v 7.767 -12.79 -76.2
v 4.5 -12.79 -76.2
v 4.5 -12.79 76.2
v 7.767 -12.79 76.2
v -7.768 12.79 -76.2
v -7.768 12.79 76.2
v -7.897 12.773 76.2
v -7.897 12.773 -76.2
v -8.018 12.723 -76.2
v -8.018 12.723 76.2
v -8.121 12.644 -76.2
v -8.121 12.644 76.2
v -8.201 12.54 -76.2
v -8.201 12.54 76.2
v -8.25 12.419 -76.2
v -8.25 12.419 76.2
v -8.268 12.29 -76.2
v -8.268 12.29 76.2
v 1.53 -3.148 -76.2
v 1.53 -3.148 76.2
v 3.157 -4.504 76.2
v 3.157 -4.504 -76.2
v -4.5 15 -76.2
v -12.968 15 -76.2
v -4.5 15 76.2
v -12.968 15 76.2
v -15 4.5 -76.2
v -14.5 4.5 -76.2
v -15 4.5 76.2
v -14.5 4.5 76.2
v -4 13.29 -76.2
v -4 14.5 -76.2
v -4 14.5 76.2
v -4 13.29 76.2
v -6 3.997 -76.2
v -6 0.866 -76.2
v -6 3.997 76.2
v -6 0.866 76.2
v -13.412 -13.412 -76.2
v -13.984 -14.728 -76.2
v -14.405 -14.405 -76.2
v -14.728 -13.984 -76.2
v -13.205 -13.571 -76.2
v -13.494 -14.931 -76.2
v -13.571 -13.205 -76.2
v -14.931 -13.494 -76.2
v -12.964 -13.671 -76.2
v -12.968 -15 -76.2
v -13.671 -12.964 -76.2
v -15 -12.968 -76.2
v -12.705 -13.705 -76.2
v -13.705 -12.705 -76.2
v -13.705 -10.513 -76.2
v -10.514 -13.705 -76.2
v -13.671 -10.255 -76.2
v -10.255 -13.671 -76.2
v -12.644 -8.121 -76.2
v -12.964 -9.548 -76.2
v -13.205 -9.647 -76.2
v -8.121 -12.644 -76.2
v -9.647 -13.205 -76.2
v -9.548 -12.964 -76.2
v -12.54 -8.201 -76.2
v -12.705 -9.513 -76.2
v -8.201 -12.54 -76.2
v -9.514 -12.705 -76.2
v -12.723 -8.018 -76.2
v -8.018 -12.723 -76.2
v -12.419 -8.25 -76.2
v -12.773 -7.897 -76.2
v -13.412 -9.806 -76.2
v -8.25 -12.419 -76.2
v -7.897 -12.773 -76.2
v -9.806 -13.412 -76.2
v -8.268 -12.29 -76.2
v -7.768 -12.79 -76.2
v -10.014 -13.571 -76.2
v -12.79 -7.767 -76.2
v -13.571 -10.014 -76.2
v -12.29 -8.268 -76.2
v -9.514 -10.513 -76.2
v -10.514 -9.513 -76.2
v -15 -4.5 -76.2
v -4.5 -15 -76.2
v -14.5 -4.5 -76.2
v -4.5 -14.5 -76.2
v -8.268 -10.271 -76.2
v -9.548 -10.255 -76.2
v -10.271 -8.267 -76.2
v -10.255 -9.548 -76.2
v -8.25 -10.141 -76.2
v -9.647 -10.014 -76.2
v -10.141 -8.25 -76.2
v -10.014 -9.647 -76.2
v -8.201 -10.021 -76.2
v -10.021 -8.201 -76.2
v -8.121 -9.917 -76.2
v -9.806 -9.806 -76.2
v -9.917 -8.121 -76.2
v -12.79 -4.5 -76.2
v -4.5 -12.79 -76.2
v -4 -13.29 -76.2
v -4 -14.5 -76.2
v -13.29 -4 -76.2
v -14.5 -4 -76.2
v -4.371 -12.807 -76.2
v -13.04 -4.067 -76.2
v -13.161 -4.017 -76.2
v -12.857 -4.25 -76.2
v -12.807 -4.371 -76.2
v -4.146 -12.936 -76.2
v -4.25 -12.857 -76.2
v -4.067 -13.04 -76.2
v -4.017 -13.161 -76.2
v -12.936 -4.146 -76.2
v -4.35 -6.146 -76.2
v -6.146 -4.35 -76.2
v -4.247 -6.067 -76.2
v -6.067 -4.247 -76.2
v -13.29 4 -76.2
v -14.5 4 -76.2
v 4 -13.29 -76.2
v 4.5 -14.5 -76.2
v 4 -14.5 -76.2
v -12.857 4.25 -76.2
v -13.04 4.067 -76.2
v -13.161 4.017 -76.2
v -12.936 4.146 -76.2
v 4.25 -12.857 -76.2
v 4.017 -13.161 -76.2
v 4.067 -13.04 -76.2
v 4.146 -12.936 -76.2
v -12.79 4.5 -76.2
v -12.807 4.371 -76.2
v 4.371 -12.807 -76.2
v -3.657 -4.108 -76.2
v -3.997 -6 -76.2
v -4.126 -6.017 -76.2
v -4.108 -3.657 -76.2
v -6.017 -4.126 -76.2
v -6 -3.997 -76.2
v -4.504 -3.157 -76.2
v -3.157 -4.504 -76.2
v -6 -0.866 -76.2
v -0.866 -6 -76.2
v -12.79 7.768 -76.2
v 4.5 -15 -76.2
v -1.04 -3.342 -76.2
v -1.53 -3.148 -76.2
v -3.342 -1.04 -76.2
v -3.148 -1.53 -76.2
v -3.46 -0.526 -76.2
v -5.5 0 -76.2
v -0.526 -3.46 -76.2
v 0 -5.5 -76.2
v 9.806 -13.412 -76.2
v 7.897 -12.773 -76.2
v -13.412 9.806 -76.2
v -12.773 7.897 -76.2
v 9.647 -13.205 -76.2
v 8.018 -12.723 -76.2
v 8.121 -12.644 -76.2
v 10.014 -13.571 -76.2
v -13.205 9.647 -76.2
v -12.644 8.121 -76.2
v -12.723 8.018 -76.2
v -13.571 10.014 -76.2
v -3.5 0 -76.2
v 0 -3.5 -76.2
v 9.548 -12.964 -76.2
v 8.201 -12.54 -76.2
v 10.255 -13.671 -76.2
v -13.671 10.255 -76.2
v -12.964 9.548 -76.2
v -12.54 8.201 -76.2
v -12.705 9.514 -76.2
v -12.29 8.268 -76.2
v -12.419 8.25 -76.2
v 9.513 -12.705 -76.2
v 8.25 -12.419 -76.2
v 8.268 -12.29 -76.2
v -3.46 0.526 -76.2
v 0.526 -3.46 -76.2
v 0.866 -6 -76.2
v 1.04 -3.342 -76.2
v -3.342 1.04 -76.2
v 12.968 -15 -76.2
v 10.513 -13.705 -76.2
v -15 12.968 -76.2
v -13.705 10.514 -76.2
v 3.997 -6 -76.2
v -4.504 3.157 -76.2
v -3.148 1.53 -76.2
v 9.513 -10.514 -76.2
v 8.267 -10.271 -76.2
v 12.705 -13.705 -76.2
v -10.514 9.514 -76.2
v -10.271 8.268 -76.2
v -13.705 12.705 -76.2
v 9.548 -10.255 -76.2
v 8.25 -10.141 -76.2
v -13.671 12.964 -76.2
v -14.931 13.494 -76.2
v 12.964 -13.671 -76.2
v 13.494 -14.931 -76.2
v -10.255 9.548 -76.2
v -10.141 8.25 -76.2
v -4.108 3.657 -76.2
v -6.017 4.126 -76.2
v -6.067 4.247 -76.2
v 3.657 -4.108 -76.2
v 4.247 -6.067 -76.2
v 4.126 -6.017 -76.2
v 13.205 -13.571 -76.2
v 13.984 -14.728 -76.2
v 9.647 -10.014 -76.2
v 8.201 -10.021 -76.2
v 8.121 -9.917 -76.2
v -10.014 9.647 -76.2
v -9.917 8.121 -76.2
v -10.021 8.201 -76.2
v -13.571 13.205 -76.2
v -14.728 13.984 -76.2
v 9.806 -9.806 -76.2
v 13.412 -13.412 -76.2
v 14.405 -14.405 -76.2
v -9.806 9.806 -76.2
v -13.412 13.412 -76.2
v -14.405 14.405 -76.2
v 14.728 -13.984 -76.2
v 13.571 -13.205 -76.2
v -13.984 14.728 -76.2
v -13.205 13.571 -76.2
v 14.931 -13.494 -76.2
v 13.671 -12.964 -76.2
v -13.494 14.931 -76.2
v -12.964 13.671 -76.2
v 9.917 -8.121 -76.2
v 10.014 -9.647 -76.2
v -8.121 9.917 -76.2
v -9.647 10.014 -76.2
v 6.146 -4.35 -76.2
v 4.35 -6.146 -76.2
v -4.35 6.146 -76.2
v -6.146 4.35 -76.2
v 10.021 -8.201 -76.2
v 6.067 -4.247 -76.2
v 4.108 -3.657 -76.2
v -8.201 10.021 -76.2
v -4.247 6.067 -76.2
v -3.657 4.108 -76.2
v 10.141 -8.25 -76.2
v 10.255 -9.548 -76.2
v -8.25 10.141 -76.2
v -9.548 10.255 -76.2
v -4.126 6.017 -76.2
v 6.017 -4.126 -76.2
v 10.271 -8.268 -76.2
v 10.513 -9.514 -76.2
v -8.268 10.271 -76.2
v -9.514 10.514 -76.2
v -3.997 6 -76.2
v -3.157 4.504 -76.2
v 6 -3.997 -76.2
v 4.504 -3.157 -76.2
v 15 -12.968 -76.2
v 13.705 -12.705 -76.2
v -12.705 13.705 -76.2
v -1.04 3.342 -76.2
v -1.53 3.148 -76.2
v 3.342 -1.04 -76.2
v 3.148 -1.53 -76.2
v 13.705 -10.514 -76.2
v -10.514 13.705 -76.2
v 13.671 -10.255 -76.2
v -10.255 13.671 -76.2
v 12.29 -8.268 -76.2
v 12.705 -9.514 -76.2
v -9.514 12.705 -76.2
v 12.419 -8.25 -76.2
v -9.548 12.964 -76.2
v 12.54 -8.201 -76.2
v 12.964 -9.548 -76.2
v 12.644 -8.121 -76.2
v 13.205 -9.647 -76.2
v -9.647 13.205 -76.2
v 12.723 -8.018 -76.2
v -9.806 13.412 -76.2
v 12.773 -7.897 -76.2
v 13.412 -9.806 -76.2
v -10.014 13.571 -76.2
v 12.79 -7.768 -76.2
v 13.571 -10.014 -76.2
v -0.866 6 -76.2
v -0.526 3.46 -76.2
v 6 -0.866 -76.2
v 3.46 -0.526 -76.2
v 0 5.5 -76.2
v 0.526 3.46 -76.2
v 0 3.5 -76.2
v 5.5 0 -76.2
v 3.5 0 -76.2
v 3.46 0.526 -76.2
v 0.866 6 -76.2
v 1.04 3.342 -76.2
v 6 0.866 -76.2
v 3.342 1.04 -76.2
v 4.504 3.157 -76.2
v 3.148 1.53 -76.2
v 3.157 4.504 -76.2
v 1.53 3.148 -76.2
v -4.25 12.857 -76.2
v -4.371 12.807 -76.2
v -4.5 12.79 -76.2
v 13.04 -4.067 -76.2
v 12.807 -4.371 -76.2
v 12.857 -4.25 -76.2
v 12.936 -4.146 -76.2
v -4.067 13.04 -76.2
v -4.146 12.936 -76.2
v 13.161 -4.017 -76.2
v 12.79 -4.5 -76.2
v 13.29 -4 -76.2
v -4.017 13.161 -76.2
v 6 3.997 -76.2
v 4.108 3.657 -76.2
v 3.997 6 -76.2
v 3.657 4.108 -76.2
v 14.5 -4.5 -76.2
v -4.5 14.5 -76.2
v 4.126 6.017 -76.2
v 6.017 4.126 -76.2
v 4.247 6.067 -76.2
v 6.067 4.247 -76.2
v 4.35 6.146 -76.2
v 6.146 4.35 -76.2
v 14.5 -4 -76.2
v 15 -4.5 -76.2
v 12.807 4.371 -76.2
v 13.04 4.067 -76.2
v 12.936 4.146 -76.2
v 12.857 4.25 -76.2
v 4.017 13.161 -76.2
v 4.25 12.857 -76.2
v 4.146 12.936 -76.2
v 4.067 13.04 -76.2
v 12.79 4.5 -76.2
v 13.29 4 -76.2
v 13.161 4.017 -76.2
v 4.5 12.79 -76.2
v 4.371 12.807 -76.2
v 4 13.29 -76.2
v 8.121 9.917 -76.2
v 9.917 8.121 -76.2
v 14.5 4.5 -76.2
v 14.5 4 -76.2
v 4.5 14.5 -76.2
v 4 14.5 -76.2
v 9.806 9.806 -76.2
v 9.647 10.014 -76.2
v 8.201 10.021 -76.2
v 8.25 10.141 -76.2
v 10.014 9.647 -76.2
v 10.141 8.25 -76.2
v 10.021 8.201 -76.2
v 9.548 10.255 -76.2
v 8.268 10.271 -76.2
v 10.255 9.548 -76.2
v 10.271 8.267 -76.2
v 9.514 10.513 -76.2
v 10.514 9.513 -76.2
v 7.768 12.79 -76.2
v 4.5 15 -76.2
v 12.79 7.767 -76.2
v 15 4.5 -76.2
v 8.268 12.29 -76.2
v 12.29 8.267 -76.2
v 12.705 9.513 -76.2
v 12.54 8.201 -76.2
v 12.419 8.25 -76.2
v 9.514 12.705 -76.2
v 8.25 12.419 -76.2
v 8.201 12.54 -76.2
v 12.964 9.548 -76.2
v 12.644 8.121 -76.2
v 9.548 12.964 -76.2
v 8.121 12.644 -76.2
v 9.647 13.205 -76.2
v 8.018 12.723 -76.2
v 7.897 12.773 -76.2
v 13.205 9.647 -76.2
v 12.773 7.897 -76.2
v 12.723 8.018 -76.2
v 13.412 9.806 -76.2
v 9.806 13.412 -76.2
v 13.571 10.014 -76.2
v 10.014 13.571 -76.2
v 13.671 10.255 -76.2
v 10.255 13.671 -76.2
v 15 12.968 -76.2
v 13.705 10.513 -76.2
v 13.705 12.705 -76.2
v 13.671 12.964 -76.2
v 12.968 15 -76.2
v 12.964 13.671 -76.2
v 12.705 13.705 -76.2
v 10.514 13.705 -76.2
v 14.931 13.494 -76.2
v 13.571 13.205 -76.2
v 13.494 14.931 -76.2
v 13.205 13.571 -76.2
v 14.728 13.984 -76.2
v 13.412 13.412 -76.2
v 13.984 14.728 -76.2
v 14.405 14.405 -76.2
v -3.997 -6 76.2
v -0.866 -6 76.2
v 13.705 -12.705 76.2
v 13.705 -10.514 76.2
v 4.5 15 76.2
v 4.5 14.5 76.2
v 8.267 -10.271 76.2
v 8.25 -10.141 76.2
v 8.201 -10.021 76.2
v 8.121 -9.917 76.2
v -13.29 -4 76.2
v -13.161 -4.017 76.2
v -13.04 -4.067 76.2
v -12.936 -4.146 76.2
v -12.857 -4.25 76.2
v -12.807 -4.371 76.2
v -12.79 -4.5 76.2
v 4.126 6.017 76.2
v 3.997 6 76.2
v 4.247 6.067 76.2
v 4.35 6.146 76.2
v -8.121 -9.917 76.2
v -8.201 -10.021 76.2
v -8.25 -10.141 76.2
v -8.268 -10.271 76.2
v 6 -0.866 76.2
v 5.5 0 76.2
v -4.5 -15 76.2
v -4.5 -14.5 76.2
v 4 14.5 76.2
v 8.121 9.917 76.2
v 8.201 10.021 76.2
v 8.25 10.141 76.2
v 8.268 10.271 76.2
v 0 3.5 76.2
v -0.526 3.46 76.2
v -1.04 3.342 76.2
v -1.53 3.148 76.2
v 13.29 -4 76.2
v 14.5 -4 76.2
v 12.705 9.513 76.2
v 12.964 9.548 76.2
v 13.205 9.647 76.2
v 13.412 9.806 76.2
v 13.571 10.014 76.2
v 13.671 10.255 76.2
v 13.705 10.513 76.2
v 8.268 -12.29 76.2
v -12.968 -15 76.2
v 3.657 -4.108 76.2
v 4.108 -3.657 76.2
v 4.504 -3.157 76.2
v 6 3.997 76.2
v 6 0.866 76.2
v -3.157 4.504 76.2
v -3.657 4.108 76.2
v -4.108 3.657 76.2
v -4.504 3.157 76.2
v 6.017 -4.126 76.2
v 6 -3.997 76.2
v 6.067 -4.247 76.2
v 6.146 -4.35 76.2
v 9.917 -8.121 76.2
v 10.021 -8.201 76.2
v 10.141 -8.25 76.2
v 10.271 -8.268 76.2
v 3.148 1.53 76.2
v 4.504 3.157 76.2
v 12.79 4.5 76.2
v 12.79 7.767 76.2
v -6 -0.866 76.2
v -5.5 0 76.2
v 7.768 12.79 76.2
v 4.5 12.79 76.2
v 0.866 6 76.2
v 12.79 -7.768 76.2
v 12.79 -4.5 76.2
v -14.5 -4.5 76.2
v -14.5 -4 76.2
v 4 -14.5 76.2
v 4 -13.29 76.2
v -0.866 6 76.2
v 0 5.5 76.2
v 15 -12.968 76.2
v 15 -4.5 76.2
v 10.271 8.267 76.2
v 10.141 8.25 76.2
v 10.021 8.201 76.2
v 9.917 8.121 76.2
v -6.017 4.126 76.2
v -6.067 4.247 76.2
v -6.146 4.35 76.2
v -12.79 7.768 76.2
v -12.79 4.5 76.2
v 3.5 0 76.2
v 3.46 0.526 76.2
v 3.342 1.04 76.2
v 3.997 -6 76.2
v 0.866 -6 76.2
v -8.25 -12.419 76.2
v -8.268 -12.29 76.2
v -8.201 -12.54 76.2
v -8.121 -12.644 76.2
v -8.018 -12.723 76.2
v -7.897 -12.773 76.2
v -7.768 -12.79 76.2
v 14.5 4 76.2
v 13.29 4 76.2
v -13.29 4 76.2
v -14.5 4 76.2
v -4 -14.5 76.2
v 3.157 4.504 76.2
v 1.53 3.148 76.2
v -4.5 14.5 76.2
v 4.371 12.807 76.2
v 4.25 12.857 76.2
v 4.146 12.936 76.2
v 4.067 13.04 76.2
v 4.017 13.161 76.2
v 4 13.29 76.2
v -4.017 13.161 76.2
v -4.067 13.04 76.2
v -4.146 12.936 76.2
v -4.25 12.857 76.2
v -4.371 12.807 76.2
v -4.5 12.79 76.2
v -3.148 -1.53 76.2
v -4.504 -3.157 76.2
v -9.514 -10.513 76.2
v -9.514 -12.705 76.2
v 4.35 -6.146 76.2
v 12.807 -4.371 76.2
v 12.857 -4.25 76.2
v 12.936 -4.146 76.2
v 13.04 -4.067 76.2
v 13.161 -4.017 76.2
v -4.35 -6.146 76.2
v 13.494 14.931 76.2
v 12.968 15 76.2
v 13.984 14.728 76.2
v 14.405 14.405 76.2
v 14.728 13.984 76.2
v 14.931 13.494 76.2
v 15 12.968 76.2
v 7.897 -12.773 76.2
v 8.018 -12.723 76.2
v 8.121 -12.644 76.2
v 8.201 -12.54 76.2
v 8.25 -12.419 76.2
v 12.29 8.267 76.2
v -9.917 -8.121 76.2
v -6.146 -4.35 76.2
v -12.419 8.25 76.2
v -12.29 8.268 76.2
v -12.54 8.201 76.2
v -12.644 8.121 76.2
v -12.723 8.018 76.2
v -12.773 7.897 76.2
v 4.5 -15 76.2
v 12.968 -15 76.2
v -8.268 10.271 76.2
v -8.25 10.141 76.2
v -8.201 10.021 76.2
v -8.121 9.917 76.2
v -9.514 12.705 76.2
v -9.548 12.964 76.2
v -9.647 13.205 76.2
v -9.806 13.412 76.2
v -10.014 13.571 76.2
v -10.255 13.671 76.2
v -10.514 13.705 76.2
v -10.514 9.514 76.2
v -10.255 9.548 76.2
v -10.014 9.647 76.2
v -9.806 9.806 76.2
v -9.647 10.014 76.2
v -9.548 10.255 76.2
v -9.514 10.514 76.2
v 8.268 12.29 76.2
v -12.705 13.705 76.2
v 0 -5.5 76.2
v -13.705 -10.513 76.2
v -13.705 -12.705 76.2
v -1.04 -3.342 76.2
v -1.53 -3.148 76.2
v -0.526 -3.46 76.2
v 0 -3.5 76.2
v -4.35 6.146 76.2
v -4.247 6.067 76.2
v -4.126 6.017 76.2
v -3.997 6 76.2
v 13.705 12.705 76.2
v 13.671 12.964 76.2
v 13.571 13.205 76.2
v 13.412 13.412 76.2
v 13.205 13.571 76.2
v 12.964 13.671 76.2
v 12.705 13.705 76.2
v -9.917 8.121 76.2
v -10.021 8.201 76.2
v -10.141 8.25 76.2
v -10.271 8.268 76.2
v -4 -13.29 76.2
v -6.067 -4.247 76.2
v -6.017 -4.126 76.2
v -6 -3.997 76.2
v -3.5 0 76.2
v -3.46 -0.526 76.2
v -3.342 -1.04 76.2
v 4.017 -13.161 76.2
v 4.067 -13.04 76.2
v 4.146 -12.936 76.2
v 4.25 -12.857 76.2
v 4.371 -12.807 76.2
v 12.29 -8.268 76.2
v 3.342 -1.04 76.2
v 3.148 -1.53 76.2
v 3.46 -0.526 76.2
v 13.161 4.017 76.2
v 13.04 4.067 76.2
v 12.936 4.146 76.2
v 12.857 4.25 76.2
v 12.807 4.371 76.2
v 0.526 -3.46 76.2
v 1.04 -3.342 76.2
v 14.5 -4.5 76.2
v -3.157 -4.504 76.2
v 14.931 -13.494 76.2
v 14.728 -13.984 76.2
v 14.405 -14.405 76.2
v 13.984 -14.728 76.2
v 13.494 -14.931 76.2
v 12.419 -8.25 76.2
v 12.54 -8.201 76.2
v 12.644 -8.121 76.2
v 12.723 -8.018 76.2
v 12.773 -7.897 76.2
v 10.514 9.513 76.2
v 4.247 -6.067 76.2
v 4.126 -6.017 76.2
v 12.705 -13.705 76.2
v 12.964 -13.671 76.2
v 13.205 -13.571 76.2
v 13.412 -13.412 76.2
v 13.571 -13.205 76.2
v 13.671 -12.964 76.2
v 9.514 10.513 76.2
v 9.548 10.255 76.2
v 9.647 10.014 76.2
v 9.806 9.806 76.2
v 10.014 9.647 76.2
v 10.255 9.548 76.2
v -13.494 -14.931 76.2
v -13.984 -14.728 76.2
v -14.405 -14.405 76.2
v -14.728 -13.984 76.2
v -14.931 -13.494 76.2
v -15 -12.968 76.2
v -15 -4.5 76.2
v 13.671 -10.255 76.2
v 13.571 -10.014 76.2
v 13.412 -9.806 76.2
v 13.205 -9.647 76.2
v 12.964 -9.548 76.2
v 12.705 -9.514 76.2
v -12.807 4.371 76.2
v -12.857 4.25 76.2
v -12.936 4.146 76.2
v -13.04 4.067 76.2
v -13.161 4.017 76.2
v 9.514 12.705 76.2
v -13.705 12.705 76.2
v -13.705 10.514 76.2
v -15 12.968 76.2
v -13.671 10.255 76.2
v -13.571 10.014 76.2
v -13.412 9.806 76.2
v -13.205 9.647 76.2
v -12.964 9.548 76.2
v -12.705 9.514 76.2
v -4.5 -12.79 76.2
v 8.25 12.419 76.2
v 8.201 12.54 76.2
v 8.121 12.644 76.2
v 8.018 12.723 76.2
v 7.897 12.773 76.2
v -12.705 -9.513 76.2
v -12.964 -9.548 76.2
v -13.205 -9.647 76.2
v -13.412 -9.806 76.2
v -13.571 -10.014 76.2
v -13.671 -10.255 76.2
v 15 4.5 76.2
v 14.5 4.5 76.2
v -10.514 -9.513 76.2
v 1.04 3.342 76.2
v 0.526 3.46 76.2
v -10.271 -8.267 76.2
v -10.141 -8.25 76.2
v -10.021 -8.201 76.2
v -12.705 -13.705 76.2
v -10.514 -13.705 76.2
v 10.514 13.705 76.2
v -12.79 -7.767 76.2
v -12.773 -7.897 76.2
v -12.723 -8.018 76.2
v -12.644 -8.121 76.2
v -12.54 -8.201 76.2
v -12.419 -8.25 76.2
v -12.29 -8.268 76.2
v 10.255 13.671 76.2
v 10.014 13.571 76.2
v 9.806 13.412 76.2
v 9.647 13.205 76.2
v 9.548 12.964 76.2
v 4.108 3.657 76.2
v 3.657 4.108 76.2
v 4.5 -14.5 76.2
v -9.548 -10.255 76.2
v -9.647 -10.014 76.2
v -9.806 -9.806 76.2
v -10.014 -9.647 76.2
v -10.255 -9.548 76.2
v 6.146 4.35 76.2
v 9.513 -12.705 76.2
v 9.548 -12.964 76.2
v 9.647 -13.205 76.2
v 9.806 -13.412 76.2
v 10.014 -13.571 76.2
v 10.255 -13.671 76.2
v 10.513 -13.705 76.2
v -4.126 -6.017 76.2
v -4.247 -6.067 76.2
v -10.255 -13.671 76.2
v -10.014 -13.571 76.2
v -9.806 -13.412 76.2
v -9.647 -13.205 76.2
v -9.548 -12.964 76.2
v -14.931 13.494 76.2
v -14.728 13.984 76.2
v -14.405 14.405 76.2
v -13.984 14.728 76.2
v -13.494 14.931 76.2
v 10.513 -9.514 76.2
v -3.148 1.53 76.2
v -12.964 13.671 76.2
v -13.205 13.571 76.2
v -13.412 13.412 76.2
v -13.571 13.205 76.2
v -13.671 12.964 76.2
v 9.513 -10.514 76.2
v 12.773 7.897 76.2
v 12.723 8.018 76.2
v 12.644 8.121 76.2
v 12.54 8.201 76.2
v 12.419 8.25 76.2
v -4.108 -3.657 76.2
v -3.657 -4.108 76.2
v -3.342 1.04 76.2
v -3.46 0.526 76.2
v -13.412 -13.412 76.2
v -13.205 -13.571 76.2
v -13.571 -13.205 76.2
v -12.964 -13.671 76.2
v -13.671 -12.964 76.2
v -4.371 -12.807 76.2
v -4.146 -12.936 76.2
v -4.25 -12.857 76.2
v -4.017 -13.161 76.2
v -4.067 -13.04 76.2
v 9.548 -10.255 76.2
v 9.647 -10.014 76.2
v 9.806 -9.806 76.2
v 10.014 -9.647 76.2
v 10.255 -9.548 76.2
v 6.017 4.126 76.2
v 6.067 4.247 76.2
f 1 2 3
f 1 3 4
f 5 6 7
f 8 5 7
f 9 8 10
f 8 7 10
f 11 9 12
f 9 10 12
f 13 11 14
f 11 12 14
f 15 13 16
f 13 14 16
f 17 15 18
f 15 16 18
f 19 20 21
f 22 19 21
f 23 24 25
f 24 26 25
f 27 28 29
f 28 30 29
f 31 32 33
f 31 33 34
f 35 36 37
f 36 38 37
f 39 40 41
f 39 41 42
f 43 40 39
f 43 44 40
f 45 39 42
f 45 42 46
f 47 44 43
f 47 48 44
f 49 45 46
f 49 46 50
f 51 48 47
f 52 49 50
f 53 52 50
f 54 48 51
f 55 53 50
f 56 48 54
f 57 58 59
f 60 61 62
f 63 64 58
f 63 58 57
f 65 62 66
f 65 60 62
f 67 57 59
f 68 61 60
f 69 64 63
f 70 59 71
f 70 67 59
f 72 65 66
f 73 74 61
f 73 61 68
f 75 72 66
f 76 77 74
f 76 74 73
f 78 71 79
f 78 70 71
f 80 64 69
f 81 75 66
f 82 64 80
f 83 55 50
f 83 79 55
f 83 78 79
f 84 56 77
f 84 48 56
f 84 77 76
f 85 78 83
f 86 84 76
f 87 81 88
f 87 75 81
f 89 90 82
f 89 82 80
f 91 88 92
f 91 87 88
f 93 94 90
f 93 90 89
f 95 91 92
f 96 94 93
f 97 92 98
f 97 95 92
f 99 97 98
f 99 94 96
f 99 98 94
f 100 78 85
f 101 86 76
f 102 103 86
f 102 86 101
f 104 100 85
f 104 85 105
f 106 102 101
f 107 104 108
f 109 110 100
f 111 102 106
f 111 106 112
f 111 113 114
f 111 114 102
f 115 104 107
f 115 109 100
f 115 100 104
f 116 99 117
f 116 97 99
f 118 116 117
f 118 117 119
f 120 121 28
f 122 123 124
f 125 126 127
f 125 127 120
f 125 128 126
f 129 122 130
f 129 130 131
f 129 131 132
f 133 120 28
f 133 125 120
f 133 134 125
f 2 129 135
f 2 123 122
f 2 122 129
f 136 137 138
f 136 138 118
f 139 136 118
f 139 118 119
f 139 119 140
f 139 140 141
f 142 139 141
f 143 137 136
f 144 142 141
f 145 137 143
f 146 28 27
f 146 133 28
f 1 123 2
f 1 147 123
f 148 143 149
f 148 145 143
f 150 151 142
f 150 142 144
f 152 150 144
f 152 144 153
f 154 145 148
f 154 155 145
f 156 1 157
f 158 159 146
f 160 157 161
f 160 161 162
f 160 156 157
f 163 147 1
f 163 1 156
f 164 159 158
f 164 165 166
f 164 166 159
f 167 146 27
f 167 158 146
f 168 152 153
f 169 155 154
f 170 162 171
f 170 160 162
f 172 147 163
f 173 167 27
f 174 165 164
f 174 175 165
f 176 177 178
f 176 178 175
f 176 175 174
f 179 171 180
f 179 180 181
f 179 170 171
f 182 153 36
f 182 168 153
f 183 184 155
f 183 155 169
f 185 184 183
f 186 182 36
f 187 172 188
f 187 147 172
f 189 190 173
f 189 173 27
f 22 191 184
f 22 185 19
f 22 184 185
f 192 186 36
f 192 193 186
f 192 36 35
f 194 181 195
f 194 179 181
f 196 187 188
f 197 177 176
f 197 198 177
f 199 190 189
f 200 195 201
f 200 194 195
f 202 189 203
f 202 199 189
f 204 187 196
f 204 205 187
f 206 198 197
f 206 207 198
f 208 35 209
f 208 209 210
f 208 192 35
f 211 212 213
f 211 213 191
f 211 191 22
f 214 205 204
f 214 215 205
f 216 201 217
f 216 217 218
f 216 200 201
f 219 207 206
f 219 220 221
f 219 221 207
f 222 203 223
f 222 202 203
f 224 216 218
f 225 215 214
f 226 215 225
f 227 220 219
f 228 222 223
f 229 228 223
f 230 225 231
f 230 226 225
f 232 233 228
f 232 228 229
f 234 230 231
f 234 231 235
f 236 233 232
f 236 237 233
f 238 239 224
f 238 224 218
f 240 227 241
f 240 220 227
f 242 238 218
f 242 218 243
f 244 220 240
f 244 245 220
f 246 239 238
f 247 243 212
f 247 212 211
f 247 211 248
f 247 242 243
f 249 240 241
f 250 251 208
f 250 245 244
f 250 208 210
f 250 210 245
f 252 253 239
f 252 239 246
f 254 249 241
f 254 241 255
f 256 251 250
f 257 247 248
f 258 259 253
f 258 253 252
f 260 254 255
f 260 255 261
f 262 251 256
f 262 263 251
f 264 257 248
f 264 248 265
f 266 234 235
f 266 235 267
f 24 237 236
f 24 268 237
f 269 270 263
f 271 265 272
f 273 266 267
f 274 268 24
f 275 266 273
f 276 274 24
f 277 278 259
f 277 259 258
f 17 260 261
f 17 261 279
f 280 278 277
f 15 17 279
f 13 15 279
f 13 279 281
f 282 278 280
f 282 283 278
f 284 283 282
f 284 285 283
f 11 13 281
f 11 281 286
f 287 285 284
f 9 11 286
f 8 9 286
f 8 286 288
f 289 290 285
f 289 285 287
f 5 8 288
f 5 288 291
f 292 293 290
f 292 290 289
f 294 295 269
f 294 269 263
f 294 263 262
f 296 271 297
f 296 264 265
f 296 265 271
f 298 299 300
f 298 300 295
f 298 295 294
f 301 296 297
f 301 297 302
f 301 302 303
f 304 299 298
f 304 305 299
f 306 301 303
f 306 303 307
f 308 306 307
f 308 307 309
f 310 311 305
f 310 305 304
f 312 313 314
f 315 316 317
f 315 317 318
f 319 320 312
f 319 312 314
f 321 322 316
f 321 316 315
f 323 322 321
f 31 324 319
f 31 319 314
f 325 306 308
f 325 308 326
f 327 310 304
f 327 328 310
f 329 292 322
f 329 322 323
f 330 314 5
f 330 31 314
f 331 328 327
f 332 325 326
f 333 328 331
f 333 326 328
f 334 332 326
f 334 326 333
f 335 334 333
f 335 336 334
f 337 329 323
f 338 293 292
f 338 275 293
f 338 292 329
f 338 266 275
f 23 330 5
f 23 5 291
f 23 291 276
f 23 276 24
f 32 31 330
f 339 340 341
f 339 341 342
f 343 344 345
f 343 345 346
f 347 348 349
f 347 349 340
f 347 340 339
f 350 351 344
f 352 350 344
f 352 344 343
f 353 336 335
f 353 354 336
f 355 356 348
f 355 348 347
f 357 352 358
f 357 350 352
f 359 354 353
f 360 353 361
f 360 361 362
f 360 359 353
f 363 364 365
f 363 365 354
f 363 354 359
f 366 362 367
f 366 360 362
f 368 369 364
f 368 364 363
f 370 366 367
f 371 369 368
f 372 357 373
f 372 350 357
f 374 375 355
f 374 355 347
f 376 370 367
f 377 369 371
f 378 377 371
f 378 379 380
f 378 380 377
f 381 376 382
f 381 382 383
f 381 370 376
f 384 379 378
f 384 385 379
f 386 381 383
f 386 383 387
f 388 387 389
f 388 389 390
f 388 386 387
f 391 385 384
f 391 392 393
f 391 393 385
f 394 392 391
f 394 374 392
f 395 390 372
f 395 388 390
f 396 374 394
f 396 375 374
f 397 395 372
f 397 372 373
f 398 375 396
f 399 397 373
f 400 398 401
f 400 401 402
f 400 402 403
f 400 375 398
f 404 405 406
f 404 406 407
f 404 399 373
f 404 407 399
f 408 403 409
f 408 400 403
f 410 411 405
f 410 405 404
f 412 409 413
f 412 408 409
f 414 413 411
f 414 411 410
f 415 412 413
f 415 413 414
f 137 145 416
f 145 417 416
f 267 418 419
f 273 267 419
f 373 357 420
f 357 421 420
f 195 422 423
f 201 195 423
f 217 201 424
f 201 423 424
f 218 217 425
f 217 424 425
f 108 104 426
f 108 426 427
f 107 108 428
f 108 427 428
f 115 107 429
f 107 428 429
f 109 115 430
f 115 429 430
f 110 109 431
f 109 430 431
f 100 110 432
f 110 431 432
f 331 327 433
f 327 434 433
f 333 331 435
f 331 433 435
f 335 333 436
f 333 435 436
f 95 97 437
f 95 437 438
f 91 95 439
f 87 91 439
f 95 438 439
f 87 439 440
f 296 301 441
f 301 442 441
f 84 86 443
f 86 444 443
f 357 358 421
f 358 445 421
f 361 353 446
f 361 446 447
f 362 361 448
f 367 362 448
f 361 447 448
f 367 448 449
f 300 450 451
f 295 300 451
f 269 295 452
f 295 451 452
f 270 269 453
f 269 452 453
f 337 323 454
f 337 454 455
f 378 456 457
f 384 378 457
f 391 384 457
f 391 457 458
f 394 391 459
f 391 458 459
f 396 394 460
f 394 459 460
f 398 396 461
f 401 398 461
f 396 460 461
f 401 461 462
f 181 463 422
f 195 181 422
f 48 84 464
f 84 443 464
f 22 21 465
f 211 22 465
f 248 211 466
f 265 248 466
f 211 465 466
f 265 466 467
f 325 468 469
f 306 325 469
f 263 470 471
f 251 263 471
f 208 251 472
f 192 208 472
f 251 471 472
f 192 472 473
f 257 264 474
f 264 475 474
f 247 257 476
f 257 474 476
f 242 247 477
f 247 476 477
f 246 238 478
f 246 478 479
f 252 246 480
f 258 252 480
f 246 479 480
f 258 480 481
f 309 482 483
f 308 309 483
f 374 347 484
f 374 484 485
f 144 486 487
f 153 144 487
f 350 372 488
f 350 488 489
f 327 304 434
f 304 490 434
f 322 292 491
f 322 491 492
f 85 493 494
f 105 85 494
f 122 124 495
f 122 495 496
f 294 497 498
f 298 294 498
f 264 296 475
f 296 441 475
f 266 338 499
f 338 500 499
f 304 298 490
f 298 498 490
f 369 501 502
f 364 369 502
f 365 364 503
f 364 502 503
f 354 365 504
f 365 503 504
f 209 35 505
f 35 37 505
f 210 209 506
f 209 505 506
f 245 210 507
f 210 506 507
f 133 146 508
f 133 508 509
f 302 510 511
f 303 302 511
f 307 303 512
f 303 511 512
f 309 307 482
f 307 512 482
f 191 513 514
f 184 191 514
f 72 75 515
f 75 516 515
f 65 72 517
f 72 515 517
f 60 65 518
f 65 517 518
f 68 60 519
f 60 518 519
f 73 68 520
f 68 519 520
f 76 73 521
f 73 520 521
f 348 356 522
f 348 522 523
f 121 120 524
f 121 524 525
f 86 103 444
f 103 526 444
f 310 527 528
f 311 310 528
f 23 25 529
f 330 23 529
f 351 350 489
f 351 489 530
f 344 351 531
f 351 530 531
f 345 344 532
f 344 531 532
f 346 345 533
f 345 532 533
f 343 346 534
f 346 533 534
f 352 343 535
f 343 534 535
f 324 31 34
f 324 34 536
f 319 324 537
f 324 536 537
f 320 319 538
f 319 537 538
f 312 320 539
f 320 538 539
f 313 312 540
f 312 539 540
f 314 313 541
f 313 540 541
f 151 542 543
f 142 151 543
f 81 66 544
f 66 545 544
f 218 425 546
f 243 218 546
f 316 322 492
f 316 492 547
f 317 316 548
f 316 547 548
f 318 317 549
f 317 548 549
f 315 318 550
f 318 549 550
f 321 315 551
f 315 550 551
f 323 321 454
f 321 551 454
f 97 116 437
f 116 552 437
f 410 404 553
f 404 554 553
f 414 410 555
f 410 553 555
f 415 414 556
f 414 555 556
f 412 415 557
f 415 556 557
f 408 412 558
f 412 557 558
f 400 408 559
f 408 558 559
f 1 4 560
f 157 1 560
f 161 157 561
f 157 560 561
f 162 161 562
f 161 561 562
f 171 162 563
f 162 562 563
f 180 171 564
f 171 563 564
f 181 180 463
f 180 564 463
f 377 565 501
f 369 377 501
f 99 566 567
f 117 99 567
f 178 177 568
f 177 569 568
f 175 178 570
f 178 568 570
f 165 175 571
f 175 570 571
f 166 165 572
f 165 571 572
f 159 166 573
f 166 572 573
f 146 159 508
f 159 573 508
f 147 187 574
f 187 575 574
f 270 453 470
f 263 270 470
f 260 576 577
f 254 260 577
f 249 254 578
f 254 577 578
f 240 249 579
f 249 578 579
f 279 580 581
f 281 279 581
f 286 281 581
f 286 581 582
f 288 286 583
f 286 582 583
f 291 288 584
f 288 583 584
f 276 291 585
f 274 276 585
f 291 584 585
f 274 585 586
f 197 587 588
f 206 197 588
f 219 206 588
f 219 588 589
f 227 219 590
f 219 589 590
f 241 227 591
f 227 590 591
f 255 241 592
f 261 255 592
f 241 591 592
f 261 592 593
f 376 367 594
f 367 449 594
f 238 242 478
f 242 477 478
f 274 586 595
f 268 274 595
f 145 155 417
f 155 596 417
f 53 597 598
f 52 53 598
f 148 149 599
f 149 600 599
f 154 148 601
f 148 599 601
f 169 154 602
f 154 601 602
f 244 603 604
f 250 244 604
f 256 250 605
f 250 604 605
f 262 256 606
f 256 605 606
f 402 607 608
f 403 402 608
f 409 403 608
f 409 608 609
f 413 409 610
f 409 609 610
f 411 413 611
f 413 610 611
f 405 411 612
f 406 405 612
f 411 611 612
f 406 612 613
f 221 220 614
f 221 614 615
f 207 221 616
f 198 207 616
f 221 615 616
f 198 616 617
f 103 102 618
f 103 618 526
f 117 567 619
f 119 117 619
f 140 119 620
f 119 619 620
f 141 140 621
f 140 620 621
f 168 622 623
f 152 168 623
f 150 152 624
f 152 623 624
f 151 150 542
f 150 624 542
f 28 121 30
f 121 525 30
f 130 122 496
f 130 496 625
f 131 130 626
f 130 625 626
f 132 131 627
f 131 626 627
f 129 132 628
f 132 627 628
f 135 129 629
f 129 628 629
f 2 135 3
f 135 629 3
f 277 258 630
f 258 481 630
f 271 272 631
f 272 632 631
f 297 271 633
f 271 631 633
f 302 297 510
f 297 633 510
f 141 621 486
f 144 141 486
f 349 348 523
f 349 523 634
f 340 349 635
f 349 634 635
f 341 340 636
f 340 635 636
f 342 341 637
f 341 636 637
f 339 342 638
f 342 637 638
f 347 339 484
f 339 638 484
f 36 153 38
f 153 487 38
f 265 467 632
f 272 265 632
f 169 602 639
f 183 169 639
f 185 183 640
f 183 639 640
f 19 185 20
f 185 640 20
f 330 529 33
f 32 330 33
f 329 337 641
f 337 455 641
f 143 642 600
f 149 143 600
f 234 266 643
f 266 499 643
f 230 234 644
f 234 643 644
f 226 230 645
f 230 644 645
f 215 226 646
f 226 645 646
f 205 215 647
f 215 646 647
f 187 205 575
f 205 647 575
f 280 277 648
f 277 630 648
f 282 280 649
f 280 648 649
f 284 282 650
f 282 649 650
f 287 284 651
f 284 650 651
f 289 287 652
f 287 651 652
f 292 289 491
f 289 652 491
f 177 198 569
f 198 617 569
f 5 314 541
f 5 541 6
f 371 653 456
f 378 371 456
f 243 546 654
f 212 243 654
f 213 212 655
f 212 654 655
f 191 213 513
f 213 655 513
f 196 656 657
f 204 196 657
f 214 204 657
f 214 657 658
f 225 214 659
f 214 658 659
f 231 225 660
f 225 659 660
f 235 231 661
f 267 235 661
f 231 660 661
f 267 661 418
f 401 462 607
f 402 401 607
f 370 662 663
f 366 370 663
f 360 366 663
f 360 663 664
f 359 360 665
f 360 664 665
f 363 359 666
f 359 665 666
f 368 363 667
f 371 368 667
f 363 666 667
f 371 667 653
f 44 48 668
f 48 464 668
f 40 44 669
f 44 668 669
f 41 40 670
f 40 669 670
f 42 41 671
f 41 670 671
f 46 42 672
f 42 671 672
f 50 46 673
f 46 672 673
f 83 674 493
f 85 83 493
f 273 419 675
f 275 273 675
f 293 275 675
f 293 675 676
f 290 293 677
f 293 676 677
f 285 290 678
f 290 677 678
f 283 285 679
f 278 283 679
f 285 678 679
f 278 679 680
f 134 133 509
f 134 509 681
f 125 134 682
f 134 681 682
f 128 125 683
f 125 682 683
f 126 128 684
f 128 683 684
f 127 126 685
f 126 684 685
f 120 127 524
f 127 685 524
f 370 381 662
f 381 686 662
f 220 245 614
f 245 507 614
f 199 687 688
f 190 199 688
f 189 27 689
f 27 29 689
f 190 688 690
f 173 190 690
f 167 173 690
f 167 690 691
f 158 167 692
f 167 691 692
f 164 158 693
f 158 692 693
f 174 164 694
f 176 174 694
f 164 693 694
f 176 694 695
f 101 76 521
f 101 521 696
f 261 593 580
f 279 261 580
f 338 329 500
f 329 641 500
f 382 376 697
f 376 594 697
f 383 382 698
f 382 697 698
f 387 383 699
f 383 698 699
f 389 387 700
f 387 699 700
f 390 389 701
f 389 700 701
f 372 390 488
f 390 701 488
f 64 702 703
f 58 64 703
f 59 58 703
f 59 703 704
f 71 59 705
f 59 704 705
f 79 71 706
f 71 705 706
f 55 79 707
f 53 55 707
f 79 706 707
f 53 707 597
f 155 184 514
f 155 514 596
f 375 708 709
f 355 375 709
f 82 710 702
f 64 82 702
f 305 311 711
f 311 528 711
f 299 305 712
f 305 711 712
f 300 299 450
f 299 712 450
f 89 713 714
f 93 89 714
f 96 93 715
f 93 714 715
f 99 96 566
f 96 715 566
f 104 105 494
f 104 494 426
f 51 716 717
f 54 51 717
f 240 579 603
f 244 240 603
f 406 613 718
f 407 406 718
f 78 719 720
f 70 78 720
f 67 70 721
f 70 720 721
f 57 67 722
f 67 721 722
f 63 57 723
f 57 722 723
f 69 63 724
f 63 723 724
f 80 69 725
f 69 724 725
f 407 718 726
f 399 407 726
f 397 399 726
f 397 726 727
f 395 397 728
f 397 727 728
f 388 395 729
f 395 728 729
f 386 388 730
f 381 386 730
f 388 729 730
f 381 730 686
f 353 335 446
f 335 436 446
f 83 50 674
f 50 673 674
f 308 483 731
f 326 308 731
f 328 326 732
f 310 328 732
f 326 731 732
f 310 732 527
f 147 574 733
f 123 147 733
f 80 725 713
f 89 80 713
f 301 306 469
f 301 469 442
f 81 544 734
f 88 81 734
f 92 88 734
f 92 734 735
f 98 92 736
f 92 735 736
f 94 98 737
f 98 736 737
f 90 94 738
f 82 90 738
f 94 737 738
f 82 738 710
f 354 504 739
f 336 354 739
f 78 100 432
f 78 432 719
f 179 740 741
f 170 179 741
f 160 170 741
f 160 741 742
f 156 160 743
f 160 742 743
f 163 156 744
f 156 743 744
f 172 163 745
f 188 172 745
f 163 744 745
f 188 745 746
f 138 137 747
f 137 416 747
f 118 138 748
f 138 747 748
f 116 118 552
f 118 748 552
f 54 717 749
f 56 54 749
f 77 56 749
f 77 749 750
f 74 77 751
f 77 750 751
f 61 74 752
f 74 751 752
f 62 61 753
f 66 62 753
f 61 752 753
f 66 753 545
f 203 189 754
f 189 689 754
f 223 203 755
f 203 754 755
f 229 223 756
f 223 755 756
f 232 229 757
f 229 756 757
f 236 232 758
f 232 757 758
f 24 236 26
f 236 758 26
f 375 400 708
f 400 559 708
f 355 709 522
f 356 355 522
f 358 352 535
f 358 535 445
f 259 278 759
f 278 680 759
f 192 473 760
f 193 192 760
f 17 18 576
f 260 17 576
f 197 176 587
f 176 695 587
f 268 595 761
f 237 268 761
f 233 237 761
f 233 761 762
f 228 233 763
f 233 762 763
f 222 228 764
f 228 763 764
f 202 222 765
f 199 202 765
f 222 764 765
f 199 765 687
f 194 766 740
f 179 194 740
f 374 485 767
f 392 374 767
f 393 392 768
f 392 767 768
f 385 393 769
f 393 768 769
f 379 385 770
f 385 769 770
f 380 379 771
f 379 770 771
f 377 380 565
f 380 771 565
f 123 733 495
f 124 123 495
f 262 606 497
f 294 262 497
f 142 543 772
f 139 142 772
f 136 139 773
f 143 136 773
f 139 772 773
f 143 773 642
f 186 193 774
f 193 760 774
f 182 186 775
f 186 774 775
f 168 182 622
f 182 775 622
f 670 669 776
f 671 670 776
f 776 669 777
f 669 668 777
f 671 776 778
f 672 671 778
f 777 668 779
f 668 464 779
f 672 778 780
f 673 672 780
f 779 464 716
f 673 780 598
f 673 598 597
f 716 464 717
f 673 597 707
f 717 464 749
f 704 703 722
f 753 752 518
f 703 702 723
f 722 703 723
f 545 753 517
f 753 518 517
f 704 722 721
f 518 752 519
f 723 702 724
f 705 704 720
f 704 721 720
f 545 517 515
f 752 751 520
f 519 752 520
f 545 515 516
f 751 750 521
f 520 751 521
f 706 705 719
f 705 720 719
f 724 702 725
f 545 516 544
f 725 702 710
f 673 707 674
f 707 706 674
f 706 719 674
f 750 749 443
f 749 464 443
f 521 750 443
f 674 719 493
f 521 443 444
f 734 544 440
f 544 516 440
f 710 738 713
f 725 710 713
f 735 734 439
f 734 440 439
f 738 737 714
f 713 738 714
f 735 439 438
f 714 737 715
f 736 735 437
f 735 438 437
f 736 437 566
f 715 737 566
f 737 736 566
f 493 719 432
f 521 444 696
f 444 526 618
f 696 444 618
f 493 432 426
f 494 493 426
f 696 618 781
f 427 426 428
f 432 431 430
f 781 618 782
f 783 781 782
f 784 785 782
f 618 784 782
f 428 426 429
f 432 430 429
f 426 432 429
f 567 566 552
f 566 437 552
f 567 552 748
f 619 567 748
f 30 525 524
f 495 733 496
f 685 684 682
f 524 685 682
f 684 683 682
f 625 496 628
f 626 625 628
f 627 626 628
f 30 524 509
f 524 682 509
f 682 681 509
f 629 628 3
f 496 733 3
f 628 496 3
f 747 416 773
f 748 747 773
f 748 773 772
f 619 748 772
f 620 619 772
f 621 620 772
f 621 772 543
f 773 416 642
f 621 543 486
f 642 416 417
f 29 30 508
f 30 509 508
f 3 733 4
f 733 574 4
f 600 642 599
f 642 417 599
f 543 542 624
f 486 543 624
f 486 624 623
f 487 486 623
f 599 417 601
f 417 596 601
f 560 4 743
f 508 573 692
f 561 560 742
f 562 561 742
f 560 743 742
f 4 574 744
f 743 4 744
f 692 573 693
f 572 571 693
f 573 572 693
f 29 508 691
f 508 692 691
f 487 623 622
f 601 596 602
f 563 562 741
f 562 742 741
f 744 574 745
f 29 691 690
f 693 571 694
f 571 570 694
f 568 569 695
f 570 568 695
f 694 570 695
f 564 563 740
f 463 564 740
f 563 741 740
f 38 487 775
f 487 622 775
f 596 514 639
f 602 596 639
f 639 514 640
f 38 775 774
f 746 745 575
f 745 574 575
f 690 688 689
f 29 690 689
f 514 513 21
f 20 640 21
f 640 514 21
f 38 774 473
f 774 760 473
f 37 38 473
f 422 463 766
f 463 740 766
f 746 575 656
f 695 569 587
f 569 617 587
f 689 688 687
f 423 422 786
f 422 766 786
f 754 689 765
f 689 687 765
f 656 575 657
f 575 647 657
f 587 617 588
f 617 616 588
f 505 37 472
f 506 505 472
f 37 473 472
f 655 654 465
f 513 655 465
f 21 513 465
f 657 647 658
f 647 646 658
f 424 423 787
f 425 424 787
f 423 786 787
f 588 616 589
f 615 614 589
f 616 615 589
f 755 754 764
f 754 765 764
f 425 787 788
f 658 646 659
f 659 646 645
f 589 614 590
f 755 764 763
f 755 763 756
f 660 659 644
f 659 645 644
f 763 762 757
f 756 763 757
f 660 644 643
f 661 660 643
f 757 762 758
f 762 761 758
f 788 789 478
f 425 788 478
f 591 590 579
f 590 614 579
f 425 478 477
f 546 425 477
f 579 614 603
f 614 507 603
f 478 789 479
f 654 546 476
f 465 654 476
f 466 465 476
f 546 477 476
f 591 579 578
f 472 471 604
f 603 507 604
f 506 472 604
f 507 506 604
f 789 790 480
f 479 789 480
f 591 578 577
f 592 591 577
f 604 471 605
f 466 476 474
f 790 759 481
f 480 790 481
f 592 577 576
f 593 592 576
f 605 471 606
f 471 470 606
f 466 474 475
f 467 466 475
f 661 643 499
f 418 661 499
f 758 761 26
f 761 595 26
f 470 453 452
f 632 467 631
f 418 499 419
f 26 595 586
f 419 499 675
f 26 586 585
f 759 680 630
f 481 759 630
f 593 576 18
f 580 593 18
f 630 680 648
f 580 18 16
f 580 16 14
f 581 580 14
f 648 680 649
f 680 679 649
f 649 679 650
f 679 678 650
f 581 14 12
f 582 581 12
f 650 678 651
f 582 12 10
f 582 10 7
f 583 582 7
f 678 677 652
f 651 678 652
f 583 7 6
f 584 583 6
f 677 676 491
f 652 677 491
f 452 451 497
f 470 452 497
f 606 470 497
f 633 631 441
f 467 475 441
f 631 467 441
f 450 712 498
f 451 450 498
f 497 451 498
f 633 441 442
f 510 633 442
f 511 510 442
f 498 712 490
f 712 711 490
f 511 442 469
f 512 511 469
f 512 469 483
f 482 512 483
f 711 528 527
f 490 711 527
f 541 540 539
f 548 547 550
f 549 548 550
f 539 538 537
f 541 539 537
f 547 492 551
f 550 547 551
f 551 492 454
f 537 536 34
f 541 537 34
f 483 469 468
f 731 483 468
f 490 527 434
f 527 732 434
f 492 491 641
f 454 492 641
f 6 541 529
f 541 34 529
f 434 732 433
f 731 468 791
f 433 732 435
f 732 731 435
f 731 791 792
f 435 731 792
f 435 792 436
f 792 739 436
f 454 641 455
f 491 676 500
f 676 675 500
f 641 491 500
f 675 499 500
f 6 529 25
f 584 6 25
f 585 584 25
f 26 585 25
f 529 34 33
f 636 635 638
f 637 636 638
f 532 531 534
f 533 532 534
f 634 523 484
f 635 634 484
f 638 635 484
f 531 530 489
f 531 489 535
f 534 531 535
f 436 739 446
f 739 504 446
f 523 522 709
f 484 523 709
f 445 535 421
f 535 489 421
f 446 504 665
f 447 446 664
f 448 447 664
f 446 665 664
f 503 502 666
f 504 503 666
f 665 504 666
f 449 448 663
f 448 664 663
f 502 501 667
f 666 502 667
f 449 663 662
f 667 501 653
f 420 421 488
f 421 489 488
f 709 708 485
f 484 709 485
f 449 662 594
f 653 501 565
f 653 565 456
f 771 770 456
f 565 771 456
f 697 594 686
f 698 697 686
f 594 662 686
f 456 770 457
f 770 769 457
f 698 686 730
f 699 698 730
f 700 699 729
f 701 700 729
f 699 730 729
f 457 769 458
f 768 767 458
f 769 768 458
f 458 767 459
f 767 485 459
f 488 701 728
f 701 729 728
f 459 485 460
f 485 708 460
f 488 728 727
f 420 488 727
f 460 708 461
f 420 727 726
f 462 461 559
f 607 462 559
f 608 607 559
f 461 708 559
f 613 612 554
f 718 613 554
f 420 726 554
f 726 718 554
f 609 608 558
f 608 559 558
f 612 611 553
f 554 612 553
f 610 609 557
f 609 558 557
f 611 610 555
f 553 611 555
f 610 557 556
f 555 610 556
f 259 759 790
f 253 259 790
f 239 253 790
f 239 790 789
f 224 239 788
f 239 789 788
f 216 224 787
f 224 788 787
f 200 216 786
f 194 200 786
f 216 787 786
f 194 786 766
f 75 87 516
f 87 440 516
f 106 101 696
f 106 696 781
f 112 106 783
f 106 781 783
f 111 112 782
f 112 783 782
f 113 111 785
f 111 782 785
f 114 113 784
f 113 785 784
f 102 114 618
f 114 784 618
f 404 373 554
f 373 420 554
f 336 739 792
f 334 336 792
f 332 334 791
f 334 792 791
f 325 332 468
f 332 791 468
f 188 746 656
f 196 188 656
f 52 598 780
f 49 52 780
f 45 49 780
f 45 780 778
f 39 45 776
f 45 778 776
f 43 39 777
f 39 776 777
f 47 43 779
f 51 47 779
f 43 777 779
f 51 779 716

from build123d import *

# Parameters (mm, degrees)
BOSS_EXTRUDE1_DEPTH = 76.2
CIRPATTERN1_COUNT   = 4


with BuildPart() as part:
    # Sketch3 → Boss-Extrude1 (new body, symmetric)
    with BuildSketch(Plane.XY):
        with BuildLine():
            Line((-4.503841895, 3.156803476), (-3.14772708, 1.530298739))
            ThreePointArc((-3.14772708, 1.530298739), (-3.410794979, 0.785160882), (-3.5, 0))
            Line((-3.5, 0), (-5.5, 0))
            Line((-5.5, 0), (-6, 0.866025404))
            Line((-6, 0.866025404), (-6, 3.996841995))
            ThreePointArc((-6, 3.996841995), (-6.038060234, 4.188183711), (-6.146446609, 4.350395385))
            Line((-6.146446609, 4.350395385), (-9.917104615, 8.121053391))
            ThreePointArc((-9.917104615, 8.121053391), (-10.079316289, 8.229439766), (-10.270658005, 8.2675))
            Line((-10.270658005, 8.2675), (-12.29, 8.2675))
            ThreePointArc((-12.29, 8.2675), (-12.643553391, 8.121053391), (-12.79, 7.7675))
            Line((-12.79, 7.7675), (-12.79, 4.5))
            ThreePointArc((-12.79, 4.5), (-12.936446609, 4.146446609), (-13.29, 4))
            Line((-13.29, 4), (-14.5, 4))
            Line((-14.5, 4), (-14.5, 4.5))
            Line((-14.5, 4.5), (-15, 4.5))
            Line((-15, 4.5), (-15, 12.968))
            ThreePointArc((-15, 12.968), (-14.404840979, 14.404840979), (-12.968, 15))
            Line((-12.968, 15), (-4.5, 15))
            Line((-4.5, 15), (-4.5, 14.5))
            Line((-4.5, 14.5), (-4, 14.5))
            Line((-4, 14.5), (-4, 13.29))
            ThreePointArc((-4, 13.29), (-4.146446609, 12.936446609), (-4.5, 12.79))
            Line((-4.5, 12.79), (-7.7675, 12.79))
            ThreePointArc((-7.7675, 12.79), (-8.121053391, 12.643553391), (-8.2675, 12.29))
            Line((-8.2675, 12.29), (-8.2675, 10.270658005))
            ThreePointArc((-8.2675, 10.270658005), (-8.229439766, 10.079316289), (-8.121053391, 9.917104615))
            Line((-8.121053391, 9.917104615), (-4.350395385, 6.146446609))
            ThreePointArc((-4.350395385, 6.146446609), (-4.188183711, 6.038060234), (-3.996841995, 6))
            Line((-3.996841995, 6), (-0.866025404, 6))
            Line((-0.866025404, 6), (0, 5.5))
            Line((0, 5.5), (0, 3.5))
            ThreePointArc((0, 3.5), (-0.785160882, 3.410794979), (-1.530298739, 3.14772708))
            Line((-1.530298739, 3.14772708), (-3.156803476, 4.503841895))
            ThreePointArc((-3.156803476, 4.503841895), (-3.889087297, 3.889087297), (-4.503841895, 3.156803476))
        make_face()
        with BuildLine():
            Line((-12.705, 9.5135), (-10.5135, 9.5135))
            ThreePointArc((-10.5135, 9.5135), (-9.806393219, 9.806393219), (-9.5135, 10.5135))
            Line((-9.5135, 10.5135), (-9.5135, 12.705))
            ThreePointArc((-9.5135, 12.705), (-9.806393219, 13.412106781), (-10.5135, 13.705))
            Line((-10.5135, 13.705), (-12.705, 13.705))
            ThreePointArc((-12.705, 13.705), (-13.412106781, 13.412106781), (-13.705, 12.705))
            Line((-13.705, 12.705), (-13.705, 10.5135))
            ThreePointArc((-13.705, 10.5135), (-13.412106781, 9.806393219), (-12.705, 9.5135))
        make_face(mode=Mode.SUBTRACT)
    boss_extrude1 = extrude(amount=BOSS_EXTRUDE1_DEPTH, both=True)

    # CirPattern1: Boss-Extrude1 ×4 about axis
    cirpattern1_axis = Axis((0, 0, 0), (0, 0, 1))
    for i in range(1, CIRPATTERN1_COUNT):
        add(boss_extrude1.rotate(cirpattern1_axis, i * 360 / CIRPATTERN1_COUNT))


solid = part.part
